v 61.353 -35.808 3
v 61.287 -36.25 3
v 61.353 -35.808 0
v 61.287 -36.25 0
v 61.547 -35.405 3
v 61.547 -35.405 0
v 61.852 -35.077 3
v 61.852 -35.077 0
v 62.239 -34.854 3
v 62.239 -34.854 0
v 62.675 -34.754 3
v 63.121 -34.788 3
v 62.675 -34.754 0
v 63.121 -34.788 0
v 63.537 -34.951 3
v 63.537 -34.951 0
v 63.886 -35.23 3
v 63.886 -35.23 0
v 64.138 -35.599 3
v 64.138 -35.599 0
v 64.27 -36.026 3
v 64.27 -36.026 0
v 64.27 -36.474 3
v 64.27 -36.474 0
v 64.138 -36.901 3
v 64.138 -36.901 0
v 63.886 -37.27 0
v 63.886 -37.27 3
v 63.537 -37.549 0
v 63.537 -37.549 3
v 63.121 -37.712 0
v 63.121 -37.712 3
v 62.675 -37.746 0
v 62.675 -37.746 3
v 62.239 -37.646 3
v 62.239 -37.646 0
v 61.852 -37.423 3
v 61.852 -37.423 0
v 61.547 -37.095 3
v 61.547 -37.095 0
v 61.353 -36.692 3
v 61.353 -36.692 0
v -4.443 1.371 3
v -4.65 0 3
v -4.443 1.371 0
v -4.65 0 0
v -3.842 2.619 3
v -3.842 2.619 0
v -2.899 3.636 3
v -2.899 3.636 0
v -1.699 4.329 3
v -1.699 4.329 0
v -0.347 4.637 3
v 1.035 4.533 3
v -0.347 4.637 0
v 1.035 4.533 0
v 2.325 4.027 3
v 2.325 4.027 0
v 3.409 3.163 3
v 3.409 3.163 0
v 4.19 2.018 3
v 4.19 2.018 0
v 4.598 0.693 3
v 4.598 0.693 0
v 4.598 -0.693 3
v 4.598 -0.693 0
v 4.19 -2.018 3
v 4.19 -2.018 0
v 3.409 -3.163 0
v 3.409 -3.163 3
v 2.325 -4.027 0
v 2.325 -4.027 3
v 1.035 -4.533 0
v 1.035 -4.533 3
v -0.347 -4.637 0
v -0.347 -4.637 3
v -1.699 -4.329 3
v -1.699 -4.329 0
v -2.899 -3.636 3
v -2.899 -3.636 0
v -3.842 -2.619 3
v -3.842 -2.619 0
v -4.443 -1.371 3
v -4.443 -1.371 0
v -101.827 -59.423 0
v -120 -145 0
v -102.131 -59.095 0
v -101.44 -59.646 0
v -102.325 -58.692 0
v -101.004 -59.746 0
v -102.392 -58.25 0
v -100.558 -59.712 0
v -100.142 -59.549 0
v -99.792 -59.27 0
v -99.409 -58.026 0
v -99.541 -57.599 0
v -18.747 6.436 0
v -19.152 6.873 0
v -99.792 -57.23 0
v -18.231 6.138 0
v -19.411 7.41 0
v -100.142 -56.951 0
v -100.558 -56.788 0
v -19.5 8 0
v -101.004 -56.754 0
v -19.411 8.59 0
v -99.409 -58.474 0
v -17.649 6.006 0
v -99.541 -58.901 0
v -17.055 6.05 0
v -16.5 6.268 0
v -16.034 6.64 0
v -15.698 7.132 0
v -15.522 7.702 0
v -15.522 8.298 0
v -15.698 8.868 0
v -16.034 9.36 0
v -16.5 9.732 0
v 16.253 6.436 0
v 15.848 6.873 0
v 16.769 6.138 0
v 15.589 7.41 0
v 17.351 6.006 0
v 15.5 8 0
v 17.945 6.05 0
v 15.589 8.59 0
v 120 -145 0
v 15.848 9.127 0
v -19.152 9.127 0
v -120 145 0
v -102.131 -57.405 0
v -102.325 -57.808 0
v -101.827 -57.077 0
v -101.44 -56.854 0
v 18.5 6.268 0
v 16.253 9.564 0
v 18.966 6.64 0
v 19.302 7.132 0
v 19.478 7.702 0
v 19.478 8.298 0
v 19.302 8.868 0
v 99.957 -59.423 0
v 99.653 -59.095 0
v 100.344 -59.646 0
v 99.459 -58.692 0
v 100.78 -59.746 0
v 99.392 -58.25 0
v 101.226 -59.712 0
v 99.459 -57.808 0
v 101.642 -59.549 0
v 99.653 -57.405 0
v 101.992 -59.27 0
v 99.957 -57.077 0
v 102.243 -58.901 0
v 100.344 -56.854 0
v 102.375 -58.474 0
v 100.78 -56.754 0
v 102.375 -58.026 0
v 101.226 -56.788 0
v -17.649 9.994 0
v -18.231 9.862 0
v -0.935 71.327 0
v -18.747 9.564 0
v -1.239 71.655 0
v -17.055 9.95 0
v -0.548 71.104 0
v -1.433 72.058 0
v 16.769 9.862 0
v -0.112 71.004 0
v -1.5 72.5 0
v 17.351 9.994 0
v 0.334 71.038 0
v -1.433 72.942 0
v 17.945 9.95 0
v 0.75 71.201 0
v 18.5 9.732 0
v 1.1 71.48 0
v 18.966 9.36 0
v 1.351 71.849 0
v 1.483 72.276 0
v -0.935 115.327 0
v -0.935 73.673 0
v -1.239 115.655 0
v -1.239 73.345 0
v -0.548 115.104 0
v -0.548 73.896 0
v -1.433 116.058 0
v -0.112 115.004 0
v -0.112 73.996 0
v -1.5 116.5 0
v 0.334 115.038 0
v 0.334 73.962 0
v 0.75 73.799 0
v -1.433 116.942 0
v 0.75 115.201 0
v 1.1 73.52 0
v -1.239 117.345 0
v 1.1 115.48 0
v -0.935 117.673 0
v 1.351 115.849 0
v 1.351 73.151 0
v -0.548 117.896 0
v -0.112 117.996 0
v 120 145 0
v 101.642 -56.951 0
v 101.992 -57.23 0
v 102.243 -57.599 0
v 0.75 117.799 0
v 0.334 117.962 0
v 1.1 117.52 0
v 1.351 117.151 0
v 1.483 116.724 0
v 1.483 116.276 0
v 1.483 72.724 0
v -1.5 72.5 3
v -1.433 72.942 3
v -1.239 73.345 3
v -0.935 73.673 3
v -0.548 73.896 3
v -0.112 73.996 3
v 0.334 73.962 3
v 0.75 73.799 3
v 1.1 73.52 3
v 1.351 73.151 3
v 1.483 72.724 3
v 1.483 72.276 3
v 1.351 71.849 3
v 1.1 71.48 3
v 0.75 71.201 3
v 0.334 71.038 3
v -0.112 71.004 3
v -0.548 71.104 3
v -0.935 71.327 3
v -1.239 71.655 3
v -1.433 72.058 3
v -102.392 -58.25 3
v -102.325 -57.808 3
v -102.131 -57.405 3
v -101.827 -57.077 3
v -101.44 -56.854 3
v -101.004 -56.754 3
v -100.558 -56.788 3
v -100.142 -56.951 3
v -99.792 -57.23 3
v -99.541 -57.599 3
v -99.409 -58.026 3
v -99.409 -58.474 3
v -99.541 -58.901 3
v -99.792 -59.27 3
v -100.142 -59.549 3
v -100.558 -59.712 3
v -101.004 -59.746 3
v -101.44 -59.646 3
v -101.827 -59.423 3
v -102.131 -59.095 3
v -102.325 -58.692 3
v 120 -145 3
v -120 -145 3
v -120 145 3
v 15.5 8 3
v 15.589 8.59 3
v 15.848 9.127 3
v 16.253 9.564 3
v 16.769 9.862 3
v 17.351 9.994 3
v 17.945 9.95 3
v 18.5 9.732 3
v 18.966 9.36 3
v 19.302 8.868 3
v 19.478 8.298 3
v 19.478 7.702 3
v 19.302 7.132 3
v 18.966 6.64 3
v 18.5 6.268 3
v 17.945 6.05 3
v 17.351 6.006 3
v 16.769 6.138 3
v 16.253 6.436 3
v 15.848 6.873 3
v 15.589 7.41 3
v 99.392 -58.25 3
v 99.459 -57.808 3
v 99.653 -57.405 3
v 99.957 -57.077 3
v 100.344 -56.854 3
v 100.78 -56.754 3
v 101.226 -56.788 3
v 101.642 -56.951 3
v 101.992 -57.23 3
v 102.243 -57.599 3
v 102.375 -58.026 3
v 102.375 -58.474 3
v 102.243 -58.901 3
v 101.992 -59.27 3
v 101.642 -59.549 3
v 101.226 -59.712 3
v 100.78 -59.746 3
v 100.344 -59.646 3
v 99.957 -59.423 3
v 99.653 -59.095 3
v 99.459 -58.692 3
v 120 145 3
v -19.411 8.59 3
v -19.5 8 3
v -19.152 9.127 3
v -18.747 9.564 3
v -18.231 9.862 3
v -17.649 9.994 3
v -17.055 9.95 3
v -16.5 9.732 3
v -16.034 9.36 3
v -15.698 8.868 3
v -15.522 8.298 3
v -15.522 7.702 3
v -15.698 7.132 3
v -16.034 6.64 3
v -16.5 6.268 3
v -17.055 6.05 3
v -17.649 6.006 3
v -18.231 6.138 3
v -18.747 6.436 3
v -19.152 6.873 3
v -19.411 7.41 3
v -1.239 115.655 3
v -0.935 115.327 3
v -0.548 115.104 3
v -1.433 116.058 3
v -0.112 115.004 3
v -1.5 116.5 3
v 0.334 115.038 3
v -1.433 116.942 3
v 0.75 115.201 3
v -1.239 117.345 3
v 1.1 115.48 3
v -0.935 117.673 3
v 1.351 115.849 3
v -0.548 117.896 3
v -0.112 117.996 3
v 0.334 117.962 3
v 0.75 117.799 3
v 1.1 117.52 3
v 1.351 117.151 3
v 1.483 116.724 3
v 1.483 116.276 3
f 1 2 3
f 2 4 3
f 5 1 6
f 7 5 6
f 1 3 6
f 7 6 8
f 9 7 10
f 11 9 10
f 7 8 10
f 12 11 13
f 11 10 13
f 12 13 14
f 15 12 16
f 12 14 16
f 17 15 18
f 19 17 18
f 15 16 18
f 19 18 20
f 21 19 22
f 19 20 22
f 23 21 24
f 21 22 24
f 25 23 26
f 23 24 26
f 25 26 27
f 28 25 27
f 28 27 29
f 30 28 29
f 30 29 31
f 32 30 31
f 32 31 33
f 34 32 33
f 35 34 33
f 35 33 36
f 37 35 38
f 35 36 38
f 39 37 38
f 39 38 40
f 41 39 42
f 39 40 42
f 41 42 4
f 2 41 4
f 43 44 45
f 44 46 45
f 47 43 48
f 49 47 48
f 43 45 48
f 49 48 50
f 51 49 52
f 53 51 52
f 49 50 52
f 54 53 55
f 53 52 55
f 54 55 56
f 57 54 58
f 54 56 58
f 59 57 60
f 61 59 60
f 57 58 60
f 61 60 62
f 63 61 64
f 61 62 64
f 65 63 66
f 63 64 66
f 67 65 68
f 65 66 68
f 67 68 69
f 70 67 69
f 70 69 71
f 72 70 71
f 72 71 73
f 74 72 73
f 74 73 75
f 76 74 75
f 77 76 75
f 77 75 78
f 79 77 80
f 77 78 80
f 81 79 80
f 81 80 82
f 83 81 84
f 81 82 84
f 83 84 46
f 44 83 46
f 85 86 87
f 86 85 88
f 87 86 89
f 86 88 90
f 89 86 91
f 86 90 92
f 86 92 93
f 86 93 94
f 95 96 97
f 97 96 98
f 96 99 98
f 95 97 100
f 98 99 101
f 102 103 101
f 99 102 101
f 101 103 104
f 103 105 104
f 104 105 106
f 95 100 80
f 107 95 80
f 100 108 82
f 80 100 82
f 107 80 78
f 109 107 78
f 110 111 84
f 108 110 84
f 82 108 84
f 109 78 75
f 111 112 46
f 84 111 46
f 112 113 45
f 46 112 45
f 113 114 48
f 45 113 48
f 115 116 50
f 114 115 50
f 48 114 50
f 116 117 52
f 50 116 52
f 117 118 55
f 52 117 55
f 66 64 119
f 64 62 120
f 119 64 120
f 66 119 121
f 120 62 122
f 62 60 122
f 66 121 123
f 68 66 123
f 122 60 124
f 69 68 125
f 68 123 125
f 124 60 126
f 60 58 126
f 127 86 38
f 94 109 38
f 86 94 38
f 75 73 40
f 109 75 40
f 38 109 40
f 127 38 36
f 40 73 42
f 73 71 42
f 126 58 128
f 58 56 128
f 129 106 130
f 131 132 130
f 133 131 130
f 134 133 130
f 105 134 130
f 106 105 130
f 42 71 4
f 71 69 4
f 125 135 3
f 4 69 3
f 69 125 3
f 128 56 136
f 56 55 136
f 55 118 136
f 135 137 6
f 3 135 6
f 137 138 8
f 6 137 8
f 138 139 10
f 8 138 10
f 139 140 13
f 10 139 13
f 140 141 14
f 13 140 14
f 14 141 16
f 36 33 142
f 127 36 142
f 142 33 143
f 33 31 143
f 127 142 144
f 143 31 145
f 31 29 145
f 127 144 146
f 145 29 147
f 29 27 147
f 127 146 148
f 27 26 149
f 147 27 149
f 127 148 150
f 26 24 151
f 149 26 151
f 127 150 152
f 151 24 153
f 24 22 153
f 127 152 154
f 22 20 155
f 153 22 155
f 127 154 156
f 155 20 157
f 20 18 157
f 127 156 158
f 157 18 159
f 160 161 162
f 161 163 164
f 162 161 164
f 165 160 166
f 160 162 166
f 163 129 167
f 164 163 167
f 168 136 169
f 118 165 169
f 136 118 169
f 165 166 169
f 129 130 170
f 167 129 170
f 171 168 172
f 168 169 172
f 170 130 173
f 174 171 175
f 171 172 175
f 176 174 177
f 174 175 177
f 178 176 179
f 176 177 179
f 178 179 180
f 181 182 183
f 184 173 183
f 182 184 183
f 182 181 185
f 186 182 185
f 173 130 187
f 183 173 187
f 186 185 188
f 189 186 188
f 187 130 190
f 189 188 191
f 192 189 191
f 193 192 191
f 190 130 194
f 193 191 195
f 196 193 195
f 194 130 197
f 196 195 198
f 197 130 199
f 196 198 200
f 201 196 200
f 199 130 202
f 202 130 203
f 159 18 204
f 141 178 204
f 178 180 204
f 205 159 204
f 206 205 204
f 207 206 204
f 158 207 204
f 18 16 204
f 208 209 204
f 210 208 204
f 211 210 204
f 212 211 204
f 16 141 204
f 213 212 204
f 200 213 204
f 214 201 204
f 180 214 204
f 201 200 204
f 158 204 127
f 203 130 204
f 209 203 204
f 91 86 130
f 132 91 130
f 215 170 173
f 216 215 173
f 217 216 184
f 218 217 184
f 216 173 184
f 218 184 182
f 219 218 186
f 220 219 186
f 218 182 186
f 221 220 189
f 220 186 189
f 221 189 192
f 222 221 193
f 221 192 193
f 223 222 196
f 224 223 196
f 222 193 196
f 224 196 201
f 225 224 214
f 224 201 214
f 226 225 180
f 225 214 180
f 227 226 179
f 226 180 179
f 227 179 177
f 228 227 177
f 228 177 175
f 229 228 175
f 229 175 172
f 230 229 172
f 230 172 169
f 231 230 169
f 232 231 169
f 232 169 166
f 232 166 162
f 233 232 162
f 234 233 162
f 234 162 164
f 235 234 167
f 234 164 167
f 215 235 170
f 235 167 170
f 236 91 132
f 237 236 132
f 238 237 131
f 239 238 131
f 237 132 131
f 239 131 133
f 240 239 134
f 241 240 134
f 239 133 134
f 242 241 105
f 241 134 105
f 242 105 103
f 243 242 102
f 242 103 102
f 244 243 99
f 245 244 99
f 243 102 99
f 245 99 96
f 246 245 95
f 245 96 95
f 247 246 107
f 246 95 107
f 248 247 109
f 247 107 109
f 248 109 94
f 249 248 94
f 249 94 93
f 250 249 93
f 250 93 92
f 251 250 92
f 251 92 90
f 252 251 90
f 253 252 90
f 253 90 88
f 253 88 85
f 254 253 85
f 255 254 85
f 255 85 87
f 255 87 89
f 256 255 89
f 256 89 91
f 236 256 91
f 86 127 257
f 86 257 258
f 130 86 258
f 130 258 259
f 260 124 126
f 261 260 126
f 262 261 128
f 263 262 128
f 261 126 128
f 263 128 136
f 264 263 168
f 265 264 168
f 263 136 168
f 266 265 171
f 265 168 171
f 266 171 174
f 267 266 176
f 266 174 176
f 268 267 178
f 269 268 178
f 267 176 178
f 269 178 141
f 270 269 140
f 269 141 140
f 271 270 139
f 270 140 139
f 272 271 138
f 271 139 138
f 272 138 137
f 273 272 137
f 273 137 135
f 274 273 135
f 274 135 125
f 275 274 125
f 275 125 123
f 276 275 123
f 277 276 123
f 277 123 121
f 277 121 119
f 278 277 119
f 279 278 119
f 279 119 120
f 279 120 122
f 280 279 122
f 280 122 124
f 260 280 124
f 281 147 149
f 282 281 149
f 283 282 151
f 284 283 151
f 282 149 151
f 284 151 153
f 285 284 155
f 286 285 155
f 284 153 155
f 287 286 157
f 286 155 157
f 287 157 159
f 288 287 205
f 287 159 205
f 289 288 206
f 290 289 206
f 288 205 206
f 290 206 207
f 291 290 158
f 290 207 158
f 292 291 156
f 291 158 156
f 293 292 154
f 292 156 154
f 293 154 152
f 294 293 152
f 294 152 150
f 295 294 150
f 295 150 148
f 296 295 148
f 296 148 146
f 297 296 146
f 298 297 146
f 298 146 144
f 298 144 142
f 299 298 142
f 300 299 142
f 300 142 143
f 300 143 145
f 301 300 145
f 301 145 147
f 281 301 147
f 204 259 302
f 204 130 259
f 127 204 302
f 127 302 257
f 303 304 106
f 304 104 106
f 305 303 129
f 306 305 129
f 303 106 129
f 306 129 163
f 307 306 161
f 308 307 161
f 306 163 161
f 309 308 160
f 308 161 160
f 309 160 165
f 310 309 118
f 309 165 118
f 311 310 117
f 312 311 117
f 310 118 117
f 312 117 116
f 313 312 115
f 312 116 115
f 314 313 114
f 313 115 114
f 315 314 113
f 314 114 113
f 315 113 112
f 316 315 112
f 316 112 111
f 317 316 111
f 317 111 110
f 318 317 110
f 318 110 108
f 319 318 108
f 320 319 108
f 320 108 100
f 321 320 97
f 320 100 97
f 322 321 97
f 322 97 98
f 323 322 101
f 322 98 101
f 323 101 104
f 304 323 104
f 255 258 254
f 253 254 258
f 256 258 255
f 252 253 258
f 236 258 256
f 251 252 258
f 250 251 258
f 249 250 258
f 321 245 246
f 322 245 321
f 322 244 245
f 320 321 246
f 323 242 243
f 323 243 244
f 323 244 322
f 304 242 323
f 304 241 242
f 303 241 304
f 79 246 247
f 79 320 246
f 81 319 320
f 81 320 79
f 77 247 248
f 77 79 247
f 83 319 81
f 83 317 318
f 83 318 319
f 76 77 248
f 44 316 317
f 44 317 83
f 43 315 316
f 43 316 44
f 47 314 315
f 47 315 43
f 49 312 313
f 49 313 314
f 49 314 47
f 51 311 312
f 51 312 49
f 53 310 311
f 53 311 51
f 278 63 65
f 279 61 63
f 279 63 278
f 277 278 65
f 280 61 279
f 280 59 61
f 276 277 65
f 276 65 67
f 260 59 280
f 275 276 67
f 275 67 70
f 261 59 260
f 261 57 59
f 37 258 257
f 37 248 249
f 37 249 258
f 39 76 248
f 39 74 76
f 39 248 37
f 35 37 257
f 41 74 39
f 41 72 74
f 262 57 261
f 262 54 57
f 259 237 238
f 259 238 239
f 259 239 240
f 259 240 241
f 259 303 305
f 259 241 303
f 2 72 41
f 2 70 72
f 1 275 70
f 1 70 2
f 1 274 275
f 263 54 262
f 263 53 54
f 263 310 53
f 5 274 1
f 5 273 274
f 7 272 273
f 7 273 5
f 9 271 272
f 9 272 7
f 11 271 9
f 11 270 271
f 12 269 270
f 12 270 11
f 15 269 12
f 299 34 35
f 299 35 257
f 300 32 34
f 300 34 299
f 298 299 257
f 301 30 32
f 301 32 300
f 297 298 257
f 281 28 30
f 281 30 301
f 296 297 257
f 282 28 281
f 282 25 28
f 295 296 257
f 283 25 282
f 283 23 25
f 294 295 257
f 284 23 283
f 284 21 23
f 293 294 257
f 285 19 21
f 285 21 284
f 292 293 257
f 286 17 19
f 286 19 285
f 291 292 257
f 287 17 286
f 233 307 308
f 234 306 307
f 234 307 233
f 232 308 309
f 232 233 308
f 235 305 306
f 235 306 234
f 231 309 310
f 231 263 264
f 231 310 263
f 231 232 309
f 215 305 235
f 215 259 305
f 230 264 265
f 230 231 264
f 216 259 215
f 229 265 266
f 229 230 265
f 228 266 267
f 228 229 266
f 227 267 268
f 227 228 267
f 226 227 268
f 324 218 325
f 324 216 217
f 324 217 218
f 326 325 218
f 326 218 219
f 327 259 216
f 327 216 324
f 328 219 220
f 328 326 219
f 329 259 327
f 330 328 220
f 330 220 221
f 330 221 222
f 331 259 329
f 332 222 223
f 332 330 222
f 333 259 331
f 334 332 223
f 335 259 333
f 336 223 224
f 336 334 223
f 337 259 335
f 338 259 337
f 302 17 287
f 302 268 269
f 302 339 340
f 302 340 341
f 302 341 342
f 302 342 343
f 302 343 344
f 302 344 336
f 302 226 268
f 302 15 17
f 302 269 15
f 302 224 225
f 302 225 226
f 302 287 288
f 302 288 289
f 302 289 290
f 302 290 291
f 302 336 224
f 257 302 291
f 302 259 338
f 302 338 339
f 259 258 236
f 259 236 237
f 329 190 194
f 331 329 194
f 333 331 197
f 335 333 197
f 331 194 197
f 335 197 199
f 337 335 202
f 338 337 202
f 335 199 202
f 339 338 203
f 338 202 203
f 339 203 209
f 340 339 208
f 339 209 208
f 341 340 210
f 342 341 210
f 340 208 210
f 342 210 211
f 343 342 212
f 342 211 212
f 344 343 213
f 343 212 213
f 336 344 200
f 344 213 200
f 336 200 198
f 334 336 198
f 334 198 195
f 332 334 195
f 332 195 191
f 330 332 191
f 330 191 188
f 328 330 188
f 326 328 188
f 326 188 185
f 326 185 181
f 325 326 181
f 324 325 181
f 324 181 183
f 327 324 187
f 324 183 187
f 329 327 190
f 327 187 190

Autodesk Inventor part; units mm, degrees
ref_plane "XZ Plane" through (0, 0, 0) normal (0, 1, 0) x (-1, 0, 0)
ref_plane "XY Plane" through (0, 0, 0) normal (0, 0, 1) x (1, 0, 0)
sketch "Эскиз1" plane through (0, 0, 0) normal (0, 0, 1) x (1, 0, 0)
  line L0 (-120, 145) -> (120, 145)
  line L1 (120, 145) -> (120, -145)
  line L2 (120, -145) -> (-120, -145)
  line L3 (-120, -145) -> (-120, 145)
  line L4 (-120, 145) -> (120, -145) construction
  line L5 (120, 145) -> (-120, -145) construction
  point P0 (0, 0)
  dimension "d0" = 240
  dimension "d1" = 290
extrude "Выдавливание1" add sketch "Эскиз1" along normal blind 3
sketch "Эскиз2" plane through (0, 0, 3) normal (0, 0, 1) x (1, 0, 0)
  line L0 (-5, 120) -> (5, 120)
  line L1 (120, 145) -> (-120, 145) projected
  line L2 (0, 203) -> (0, -203) projected
  line L3 (-101.423, -64.3301) -> (-106.423, -55.6699)
  line L4 (106.423, -55.6699) -> (101.423, -64.3301)
  point P0 (0, 0)
  point P1 (0, 120)
  point P2 (0, 0)
  point P3 (-103.923, -60)
  point P4 (103.923, -60)
  dimension "d4" = 25
  dimension "d5" = 10
  dimension "d8" = 360
  dimension "d10" = 120
sketch "Эскиз3" plane through (0, 0, 0) normal (0, 0, -1) x (-1, 0, 0)
  circle A0 centre (17.5, 8) radius 2 projected
  circle A1 centre (-17.5, 8) radius 2 projected
  circle A2 centre (-100.892, -58.25) radius 1.5 projected
  circle A3 centre (-62.7868, -36.25) radius 1.5 projected
  circle A4 centre (100.892, -58.25) radius 1.5 projected
  circle A5 centre (62.7868, -36.25) radius 1.5 projected
  circle A6 centre (0, 116.5) radius 1.5 projected
  circle A7 centre (0, 72.5) radius 1.5 projected
  circle A8 centre (0, 0) radius 4.6 projected
  circle A9 centre (0, 0) radius 4.65
  point P0 (0, 0)
  dimension "d13" = 0.05
extrude "Выдавливание2" cut sketch "Эскиз3" against normal through all contours A0 | A1 | A2 | A3 | A4 | A6 | A7 | A8 | A9
properties part number "верхняя пластина"
